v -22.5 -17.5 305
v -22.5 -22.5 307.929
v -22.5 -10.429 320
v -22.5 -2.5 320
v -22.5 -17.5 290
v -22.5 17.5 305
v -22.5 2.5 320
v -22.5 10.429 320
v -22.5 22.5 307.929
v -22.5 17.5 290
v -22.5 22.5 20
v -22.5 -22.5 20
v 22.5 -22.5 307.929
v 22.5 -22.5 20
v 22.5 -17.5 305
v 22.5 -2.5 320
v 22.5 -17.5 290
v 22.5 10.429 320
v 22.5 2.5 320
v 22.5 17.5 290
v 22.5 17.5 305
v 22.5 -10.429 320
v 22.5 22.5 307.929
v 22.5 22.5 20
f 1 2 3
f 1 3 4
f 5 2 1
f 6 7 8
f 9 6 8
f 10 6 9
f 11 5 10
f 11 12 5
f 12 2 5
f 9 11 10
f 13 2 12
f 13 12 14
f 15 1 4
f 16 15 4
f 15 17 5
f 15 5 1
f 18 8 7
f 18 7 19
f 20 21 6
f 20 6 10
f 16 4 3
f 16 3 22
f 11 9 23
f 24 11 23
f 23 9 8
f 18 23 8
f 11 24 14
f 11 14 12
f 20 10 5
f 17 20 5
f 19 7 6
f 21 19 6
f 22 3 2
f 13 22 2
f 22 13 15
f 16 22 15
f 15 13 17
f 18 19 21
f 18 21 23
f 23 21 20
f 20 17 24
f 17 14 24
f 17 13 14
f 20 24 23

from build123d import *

# Parameters (mm, degrees)
SKETCH1_W           = 45
SKETCH1_H           = 45
BOSS_EXTRUDE1_DEPTH = 320
CUT_EXTRUDE3_DEPTH  = 50
SKETCH3_W           = 45
SKETCH3_H           = 45
CUT_EXTRUDE4_DEPTH  = 20


with BuildPart() as part:
    # Sketch1 → Boss-Extrude1 (new body)
    with BuildSketch(Plane.XY):
        Rectangle(SKETCH1_W, SKETCH1_H)
    extrude(amount=BOSS_EXTRUDE1_DEPTH)

    # Sketch2 → Cut-Extrude3 (cut)
    with BuildSketch(Plane.ZY.offset(22.5)):
        Polygon((290, 17.5), (290, -17.5), (305, -17.5), (320, -2.5), (320, 2.5), (305, 17.5), align=None)
        Polygon((320, 22.5), (307.928932188, 22.5), (320, 10.428932188), align=None)
        Polygon((320, -10.428932188), (307.928932188, -22.5), (320, -22.5), align=None)
    extrude(amount=-CUT_EXTRUDE3_DEPTH, mode=Mode.SUBTRACT)

    # Sketch3 → Cut-Extrude4 (cut)
    with BuildSketch(Plane(origin=(0, 0, 0), x_dir=(-1, 0, 0), z_dir=(0, 0, -1))):
        Rectangle(SKETCH3_W, SKETCH3_H)
    extrude(amount=-CUT_EXTRUDE4_DEPTH, mode=Mode.SUBTRACT)


solid = part.part
